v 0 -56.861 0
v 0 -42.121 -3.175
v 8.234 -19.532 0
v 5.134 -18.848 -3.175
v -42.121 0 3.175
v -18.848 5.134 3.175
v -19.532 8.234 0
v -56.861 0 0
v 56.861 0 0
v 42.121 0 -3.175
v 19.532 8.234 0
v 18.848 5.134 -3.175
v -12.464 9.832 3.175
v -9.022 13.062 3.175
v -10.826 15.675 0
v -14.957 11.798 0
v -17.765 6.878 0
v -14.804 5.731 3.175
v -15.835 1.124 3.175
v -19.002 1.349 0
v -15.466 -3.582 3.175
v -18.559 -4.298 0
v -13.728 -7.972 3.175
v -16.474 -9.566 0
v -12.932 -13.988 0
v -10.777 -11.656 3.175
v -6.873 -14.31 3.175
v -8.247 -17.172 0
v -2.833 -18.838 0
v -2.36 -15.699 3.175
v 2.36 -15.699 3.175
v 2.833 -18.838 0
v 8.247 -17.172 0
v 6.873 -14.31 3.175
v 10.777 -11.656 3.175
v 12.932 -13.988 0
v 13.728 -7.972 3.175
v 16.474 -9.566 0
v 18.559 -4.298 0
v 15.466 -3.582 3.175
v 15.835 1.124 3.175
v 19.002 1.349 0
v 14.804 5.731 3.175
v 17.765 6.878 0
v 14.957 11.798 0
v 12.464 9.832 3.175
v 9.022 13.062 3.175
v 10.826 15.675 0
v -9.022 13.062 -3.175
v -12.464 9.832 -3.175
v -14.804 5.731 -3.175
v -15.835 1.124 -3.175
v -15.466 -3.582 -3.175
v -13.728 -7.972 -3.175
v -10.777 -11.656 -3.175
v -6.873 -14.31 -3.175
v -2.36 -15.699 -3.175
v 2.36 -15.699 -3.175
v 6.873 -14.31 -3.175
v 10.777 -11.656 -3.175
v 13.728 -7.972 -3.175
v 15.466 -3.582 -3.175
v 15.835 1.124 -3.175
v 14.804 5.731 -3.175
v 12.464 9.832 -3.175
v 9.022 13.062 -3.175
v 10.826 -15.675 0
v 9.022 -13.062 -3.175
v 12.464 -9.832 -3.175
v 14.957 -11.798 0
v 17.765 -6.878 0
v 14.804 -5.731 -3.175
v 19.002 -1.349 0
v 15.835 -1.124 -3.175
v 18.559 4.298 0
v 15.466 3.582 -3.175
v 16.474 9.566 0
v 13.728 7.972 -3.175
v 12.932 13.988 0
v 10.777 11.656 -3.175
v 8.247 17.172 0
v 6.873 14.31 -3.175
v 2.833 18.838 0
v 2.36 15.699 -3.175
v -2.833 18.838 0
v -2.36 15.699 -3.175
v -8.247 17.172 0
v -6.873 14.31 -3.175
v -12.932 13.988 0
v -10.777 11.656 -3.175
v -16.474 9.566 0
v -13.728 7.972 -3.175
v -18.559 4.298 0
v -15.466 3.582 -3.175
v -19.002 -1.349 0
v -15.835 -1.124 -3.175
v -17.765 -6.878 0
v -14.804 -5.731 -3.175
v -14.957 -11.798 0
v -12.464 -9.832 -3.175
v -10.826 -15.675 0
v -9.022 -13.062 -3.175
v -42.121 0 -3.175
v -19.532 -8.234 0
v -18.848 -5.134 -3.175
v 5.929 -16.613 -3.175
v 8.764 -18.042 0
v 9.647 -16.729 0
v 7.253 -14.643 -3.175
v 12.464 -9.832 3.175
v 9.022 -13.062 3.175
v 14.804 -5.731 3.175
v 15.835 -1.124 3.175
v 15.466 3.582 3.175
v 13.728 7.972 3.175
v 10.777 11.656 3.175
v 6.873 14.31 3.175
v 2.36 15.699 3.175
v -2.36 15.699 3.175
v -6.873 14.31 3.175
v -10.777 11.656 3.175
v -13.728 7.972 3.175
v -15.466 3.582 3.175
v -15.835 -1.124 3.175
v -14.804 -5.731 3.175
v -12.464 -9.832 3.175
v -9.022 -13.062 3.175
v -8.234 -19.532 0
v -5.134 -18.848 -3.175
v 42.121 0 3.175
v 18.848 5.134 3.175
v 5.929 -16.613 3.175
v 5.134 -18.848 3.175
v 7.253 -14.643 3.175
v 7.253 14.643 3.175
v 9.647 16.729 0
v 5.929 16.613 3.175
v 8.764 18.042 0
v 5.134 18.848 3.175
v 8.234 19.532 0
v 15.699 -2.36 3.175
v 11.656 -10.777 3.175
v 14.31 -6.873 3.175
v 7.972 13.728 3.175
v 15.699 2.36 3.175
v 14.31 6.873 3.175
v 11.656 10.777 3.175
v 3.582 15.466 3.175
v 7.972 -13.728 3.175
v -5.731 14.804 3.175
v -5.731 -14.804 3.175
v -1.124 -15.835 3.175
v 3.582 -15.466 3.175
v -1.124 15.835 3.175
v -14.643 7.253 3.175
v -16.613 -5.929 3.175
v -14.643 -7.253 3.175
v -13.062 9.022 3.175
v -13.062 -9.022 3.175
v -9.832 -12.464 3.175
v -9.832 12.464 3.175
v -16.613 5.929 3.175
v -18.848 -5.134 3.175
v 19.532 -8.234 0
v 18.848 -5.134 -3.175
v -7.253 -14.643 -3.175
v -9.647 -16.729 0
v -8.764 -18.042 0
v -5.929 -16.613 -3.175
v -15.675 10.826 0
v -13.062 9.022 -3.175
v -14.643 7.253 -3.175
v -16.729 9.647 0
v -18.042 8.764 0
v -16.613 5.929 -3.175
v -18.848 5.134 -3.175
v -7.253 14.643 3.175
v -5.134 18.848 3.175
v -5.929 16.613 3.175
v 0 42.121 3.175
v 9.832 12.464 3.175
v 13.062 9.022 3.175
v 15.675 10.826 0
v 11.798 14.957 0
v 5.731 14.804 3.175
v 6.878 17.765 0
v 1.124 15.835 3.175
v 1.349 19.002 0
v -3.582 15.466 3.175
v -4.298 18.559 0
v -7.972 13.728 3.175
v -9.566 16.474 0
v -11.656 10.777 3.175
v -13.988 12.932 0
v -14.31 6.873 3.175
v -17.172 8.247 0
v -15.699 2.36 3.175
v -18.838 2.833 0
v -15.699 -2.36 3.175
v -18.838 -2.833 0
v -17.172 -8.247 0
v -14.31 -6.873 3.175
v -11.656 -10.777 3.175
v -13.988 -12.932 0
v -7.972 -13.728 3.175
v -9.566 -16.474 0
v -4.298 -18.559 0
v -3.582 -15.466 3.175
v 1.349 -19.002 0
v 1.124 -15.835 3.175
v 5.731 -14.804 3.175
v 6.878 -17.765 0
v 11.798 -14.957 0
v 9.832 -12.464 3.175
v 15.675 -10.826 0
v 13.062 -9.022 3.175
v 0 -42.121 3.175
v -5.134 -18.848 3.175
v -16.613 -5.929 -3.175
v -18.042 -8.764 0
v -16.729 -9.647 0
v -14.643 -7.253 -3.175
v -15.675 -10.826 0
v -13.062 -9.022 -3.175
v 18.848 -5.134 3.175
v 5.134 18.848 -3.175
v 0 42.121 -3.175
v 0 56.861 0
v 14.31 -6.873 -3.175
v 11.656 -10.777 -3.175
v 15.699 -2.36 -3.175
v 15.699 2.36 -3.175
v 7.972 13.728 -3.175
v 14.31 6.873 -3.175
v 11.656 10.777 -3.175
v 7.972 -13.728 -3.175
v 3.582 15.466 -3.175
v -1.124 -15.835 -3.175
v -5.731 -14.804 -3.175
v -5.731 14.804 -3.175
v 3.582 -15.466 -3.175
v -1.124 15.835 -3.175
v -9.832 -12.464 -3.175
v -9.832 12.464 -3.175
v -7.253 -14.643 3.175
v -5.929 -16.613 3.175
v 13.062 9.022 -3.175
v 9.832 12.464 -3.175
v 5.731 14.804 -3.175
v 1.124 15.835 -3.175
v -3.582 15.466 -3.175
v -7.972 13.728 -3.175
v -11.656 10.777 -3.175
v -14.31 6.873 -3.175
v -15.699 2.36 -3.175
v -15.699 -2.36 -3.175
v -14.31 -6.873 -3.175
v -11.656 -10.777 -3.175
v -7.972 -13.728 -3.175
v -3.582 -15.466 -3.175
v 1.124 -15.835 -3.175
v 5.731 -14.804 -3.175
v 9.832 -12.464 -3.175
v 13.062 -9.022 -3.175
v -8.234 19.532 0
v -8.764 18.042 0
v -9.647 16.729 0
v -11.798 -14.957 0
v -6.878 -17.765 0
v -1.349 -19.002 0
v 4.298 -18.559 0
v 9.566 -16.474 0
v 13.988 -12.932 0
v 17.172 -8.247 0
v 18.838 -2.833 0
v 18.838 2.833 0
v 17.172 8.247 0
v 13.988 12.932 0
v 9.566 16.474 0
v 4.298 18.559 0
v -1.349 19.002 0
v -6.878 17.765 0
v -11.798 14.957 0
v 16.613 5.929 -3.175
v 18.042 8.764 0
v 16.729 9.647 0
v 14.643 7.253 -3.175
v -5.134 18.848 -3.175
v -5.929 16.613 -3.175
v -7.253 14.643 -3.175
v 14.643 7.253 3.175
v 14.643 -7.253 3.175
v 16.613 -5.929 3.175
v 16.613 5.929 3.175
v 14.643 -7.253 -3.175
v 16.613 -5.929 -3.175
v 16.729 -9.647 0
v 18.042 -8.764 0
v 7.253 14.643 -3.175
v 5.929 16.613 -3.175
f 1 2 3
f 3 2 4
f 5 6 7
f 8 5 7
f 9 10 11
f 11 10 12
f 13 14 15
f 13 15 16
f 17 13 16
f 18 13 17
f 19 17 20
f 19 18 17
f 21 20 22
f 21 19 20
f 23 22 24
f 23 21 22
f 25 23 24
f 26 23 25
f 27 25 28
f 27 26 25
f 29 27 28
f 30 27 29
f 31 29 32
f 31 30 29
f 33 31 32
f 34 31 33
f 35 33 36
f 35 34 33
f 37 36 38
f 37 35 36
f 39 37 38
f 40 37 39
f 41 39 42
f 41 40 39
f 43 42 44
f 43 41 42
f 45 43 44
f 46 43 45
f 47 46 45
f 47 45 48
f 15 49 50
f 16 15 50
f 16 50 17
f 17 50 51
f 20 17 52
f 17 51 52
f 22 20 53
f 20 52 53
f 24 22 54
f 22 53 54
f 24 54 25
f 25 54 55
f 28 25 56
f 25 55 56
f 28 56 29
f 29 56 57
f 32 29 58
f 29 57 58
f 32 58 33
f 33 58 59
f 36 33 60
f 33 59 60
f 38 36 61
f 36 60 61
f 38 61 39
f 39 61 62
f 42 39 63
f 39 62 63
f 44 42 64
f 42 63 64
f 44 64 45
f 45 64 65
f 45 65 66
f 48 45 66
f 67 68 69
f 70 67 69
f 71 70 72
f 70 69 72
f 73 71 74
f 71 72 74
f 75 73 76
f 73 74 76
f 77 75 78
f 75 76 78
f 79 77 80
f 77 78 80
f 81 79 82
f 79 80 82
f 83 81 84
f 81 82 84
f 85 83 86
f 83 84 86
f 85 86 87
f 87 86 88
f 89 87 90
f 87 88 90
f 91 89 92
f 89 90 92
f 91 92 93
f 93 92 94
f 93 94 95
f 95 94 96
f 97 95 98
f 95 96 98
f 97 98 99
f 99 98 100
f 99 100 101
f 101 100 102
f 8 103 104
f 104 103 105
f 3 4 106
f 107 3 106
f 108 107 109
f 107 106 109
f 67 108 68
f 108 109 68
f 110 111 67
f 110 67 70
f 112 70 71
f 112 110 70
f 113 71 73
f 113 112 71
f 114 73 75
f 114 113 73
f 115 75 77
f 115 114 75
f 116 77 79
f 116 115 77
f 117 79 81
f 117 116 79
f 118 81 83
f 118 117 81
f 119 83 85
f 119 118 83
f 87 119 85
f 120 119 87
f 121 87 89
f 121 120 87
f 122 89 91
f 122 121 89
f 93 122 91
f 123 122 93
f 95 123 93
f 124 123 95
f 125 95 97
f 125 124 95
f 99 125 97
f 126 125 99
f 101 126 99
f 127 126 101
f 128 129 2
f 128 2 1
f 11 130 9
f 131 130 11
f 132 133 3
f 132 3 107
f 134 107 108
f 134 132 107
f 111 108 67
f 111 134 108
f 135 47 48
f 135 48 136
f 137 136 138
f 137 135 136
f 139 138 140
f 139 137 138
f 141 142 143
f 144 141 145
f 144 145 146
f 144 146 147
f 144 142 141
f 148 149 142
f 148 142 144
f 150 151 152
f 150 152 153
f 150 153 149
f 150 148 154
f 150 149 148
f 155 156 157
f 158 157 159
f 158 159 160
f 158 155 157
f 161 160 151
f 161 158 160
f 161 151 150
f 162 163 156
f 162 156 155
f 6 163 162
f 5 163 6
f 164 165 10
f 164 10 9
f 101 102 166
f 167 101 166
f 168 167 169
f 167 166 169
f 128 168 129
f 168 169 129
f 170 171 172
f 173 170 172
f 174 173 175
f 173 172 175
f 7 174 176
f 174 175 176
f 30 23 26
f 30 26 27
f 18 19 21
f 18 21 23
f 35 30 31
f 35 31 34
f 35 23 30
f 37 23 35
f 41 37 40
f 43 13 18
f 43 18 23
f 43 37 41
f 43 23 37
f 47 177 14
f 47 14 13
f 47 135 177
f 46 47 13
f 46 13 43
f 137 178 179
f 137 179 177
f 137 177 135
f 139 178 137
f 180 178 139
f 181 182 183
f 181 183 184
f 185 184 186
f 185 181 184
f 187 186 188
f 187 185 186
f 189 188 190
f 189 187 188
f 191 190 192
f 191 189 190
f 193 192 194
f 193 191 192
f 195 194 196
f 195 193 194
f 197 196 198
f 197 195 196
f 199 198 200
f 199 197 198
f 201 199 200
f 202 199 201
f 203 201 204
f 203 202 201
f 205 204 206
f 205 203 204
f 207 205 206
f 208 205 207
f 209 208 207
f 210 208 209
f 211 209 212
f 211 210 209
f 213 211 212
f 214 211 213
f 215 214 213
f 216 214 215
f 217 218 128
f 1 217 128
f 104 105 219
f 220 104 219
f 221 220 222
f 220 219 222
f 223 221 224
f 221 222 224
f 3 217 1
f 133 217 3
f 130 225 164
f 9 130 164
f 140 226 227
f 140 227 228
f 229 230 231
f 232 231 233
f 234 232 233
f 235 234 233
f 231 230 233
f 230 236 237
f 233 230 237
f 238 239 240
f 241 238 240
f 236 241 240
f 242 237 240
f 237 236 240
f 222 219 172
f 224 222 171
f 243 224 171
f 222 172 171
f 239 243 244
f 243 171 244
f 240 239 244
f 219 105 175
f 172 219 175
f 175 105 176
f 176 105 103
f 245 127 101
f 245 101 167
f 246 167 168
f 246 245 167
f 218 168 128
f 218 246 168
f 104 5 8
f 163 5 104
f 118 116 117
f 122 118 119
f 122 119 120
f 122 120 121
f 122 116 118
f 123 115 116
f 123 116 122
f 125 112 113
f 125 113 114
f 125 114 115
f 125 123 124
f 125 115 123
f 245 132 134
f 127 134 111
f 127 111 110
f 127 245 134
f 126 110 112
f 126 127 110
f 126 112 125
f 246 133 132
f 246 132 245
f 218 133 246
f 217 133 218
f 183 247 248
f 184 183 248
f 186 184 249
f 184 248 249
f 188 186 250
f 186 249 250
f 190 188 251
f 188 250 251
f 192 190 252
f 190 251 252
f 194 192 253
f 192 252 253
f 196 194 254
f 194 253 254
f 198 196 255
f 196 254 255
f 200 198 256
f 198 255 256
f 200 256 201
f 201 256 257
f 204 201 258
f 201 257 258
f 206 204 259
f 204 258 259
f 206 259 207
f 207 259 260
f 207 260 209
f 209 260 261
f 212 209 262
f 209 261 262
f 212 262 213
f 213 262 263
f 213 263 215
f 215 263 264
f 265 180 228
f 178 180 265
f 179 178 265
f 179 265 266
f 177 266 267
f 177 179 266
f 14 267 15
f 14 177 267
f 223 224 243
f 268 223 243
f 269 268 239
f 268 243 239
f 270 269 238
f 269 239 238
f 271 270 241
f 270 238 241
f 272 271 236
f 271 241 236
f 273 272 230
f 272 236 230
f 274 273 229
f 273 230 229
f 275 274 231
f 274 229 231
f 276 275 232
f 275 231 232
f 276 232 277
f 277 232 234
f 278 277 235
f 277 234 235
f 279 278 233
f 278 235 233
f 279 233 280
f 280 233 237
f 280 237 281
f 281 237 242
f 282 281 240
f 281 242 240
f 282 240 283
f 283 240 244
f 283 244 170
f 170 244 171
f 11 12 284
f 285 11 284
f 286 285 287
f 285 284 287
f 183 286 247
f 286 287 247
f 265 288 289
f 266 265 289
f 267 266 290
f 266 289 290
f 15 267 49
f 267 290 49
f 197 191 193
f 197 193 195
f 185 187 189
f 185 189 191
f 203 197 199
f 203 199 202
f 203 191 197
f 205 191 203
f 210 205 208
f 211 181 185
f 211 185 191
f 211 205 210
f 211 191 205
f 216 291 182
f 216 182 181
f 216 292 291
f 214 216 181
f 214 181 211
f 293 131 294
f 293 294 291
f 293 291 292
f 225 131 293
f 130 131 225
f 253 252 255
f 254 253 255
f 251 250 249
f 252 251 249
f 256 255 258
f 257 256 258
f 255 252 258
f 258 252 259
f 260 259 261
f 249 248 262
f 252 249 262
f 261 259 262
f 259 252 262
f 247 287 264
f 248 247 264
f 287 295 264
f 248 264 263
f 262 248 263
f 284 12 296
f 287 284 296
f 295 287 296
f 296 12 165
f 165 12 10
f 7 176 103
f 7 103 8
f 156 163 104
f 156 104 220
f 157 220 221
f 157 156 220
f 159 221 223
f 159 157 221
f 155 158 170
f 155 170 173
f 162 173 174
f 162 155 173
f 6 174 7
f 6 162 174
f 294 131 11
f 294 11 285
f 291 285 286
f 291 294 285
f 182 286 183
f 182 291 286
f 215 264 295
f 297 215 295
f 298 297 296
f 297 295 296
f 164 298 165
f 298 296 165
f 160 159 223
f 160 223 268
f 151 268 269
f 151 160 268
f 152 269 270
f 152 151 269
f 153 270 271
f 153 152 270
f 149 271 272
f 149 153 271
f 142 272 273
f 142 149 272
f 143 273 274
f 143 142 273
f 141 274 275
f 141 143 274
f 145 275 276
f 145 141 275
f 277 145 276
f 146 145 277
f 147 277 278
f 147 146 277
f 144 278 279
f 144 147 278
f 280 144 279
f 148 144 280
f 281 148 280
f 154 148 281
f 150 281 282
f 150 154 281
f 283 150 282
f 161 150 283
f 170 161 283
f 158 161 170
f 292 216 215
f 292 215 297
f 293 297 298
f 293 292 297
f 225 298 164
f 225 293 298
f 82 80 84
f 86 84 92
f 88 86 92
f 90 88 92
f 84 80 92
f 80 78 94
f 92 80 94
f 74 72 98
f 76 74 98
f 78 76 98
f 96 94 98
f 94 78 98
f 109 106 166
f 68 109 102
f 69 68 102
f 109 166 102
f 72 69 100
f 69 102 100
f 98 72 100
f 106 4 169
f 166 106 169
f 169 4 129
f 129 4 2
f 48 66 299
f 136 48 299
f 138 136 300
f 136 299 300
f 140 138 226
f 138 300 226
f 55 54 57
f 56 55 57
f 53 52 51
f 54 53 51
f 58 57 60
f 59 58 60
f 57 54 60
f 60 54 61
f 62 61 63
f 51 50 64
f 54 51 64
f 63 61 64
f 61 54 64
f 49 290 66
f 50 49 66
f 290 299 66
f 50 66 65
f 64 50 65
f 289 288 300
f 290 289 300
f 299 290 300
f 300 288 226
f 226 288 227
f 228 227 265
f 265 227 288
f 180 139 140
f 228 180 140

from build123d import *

# Parameters (mm, degrees)
F1_DEPTH  = 3.175
F2_COUNT  = 4
F3_SIZE   = 3.17499
F3_2_SIZE = 3.17499
F3_3_SIZE = 3.17499
F3_4_SIZE = 3.17499


# Not quite as in the source:
# - a fillet or chamfer is up to 0.001 mm smaller than in the source, because OpenCascade refuses the exact size


with BuildPart() as f1:
    # F0 (on Top) → F1 (new body, symmetric)
    with BuildSketch(Plane.XY):
        with BuildLine():
            ThreePointArc((-8.2339935894, 19.5317835541), (-9.164570241, 17.3575820119), (-10.8261973213, 15.6746914343))
            ThreePointArc((-10.8261973213, 15.6746914343), (0, -19.05), (10.8261973213, 15.6746914343))
            ThreePointArc((10.8261973213, 15.6746914343), (9.164570241, 17.3575820119), (8.2339935894, 19.5317835541))
            Line((8.2339935894, 19.5317835541), (0, 56.8605458856))
            Line((0, 56.8605458856), (-8.2339935894, 19.5317835541))
        make_face()
    extrude(amount=F1_DEPTH, both=True)


with BuildPart() as f2_1:
    # F2: instance of F1
    add(f1.part.rotate(Axis((0, 0, 0), (0, 0, 1)), 1 * 360 / F2_COUNT))

    # F3 (size 3.175 in the source; OpenCascade refuses exactly that, so slightly less here)
    f3_edges = [f2_1.edges().sort_by_distance(p)[0] for p in [
        (-38.196165, 4.116997, 3.175),
        (-38.196165, -4.116997, 3.175),
        (-17.357582, -9.16457, 3.175),
        (19.05, 0, 3.175),
        (-17.357582, 9.16457, 3.175),
        (-38.196165, 4.116997, -3.175),
        (-38.196165, -4.116997, -3.175),
        (-17.357582, -9.16457, -3.175),
        (19.05, 0, -3.175),
        (-17.357582, 9.16457, -3.175),
    ]]
    chamfer(f3_edges, length=F3_SIZE)


with BuildPart() as f2_2:
    # F2: instance of F1
    add(f1.part.rotate(Axis((0, 0, 0), (0, 0, 1)), 2 * 360 / F2_COUNT))

    # F3#4 (size 3.175 in the source; OpenCascade refuses exactly that, so slightly less here)
    f3_4_edges = [f2_2.edges().sort_by_distance(p)[0] for p in [
        (-4.116997, -38.196165, 3.175),
        (4.116997, -38.196165, 3.175),
        (9.16457, -17.357582, 3.175),
        (0, 19.05, 3.175),
        (-9.16457, -17.357582, 3.175),
        (-4.116997, -38.196165, -3.175),
        (4.116997, -38.196165, -3.175),
        (9.16457, -17.357582, -3.175),
        (0, 19.05, -3.175),
        (-9.16457, -17.357582, -3.175),
    ]]
    chamfer(f3_4_edges, length=F3_4_SIZE)


with BuildPart() as f2_3:
    # F2: instance of F1
    add(f1.part.rotate(Axis((0, 0, 0), (0, 0, 1)), 3 * 360 / F2_COUNT))

    # F3#3 (size 3.175 in the source; OpenCascade refuses exactly that, so slightly less here)
    f3_3_edges = [f2_3.edges().sort_by_distance(p)[0] for p in [
        (38.196165, -4.116997, 3.175),
        (38.196165, 4.116997, 3.175),
        (17.357582, 9.16457, 3.175),
        (-19.05, 0, 3.175),
        (17.357582, -9.16457, 3.175),
        (38.196165, -4.116997, -3.175),
        (38.196165, 4.116997, -3.175),
        (17.357582, 9.16457, -3.175),
        (-19.05, 0, -3.175),
        (17.357582, -9.16457, -3.175),
    ]]
    chamfer(f3_3_edges, length=F3_3_SIZE)


with BuildPart() as f1_1:
    add(f1.part)

    # F3#2 (size 3.175 in the source; OpenCascade refuses exactly that, so slightly less here)
    f3_2_edges = [f1_1.edges().sort_by_distance(p)[0] for p in [
        (4.116997, 38.196165, 3.175),
        (-4.116997, 38.196165, 3.175),
        (-9.16457, 17.357582, 3.175),
        (0, -19.05, 3.175),
        (9.16457, 17.357582, 3.175),
        (4.116997, 38.196165, -3.175),
        (-4.116997, 38.196165, -3.175),
        (-9.16457, 17.357582, -3.175),
        (0, -19.05, -3.175),
        (9.16457, 17.357582, -3.175),
    ]]
    chamfer(f3_2_edges, length=F3_2_SIZE)


solid = Compound([f2_1.part, f2_2.part, f2_3.part, f1_1.part])
